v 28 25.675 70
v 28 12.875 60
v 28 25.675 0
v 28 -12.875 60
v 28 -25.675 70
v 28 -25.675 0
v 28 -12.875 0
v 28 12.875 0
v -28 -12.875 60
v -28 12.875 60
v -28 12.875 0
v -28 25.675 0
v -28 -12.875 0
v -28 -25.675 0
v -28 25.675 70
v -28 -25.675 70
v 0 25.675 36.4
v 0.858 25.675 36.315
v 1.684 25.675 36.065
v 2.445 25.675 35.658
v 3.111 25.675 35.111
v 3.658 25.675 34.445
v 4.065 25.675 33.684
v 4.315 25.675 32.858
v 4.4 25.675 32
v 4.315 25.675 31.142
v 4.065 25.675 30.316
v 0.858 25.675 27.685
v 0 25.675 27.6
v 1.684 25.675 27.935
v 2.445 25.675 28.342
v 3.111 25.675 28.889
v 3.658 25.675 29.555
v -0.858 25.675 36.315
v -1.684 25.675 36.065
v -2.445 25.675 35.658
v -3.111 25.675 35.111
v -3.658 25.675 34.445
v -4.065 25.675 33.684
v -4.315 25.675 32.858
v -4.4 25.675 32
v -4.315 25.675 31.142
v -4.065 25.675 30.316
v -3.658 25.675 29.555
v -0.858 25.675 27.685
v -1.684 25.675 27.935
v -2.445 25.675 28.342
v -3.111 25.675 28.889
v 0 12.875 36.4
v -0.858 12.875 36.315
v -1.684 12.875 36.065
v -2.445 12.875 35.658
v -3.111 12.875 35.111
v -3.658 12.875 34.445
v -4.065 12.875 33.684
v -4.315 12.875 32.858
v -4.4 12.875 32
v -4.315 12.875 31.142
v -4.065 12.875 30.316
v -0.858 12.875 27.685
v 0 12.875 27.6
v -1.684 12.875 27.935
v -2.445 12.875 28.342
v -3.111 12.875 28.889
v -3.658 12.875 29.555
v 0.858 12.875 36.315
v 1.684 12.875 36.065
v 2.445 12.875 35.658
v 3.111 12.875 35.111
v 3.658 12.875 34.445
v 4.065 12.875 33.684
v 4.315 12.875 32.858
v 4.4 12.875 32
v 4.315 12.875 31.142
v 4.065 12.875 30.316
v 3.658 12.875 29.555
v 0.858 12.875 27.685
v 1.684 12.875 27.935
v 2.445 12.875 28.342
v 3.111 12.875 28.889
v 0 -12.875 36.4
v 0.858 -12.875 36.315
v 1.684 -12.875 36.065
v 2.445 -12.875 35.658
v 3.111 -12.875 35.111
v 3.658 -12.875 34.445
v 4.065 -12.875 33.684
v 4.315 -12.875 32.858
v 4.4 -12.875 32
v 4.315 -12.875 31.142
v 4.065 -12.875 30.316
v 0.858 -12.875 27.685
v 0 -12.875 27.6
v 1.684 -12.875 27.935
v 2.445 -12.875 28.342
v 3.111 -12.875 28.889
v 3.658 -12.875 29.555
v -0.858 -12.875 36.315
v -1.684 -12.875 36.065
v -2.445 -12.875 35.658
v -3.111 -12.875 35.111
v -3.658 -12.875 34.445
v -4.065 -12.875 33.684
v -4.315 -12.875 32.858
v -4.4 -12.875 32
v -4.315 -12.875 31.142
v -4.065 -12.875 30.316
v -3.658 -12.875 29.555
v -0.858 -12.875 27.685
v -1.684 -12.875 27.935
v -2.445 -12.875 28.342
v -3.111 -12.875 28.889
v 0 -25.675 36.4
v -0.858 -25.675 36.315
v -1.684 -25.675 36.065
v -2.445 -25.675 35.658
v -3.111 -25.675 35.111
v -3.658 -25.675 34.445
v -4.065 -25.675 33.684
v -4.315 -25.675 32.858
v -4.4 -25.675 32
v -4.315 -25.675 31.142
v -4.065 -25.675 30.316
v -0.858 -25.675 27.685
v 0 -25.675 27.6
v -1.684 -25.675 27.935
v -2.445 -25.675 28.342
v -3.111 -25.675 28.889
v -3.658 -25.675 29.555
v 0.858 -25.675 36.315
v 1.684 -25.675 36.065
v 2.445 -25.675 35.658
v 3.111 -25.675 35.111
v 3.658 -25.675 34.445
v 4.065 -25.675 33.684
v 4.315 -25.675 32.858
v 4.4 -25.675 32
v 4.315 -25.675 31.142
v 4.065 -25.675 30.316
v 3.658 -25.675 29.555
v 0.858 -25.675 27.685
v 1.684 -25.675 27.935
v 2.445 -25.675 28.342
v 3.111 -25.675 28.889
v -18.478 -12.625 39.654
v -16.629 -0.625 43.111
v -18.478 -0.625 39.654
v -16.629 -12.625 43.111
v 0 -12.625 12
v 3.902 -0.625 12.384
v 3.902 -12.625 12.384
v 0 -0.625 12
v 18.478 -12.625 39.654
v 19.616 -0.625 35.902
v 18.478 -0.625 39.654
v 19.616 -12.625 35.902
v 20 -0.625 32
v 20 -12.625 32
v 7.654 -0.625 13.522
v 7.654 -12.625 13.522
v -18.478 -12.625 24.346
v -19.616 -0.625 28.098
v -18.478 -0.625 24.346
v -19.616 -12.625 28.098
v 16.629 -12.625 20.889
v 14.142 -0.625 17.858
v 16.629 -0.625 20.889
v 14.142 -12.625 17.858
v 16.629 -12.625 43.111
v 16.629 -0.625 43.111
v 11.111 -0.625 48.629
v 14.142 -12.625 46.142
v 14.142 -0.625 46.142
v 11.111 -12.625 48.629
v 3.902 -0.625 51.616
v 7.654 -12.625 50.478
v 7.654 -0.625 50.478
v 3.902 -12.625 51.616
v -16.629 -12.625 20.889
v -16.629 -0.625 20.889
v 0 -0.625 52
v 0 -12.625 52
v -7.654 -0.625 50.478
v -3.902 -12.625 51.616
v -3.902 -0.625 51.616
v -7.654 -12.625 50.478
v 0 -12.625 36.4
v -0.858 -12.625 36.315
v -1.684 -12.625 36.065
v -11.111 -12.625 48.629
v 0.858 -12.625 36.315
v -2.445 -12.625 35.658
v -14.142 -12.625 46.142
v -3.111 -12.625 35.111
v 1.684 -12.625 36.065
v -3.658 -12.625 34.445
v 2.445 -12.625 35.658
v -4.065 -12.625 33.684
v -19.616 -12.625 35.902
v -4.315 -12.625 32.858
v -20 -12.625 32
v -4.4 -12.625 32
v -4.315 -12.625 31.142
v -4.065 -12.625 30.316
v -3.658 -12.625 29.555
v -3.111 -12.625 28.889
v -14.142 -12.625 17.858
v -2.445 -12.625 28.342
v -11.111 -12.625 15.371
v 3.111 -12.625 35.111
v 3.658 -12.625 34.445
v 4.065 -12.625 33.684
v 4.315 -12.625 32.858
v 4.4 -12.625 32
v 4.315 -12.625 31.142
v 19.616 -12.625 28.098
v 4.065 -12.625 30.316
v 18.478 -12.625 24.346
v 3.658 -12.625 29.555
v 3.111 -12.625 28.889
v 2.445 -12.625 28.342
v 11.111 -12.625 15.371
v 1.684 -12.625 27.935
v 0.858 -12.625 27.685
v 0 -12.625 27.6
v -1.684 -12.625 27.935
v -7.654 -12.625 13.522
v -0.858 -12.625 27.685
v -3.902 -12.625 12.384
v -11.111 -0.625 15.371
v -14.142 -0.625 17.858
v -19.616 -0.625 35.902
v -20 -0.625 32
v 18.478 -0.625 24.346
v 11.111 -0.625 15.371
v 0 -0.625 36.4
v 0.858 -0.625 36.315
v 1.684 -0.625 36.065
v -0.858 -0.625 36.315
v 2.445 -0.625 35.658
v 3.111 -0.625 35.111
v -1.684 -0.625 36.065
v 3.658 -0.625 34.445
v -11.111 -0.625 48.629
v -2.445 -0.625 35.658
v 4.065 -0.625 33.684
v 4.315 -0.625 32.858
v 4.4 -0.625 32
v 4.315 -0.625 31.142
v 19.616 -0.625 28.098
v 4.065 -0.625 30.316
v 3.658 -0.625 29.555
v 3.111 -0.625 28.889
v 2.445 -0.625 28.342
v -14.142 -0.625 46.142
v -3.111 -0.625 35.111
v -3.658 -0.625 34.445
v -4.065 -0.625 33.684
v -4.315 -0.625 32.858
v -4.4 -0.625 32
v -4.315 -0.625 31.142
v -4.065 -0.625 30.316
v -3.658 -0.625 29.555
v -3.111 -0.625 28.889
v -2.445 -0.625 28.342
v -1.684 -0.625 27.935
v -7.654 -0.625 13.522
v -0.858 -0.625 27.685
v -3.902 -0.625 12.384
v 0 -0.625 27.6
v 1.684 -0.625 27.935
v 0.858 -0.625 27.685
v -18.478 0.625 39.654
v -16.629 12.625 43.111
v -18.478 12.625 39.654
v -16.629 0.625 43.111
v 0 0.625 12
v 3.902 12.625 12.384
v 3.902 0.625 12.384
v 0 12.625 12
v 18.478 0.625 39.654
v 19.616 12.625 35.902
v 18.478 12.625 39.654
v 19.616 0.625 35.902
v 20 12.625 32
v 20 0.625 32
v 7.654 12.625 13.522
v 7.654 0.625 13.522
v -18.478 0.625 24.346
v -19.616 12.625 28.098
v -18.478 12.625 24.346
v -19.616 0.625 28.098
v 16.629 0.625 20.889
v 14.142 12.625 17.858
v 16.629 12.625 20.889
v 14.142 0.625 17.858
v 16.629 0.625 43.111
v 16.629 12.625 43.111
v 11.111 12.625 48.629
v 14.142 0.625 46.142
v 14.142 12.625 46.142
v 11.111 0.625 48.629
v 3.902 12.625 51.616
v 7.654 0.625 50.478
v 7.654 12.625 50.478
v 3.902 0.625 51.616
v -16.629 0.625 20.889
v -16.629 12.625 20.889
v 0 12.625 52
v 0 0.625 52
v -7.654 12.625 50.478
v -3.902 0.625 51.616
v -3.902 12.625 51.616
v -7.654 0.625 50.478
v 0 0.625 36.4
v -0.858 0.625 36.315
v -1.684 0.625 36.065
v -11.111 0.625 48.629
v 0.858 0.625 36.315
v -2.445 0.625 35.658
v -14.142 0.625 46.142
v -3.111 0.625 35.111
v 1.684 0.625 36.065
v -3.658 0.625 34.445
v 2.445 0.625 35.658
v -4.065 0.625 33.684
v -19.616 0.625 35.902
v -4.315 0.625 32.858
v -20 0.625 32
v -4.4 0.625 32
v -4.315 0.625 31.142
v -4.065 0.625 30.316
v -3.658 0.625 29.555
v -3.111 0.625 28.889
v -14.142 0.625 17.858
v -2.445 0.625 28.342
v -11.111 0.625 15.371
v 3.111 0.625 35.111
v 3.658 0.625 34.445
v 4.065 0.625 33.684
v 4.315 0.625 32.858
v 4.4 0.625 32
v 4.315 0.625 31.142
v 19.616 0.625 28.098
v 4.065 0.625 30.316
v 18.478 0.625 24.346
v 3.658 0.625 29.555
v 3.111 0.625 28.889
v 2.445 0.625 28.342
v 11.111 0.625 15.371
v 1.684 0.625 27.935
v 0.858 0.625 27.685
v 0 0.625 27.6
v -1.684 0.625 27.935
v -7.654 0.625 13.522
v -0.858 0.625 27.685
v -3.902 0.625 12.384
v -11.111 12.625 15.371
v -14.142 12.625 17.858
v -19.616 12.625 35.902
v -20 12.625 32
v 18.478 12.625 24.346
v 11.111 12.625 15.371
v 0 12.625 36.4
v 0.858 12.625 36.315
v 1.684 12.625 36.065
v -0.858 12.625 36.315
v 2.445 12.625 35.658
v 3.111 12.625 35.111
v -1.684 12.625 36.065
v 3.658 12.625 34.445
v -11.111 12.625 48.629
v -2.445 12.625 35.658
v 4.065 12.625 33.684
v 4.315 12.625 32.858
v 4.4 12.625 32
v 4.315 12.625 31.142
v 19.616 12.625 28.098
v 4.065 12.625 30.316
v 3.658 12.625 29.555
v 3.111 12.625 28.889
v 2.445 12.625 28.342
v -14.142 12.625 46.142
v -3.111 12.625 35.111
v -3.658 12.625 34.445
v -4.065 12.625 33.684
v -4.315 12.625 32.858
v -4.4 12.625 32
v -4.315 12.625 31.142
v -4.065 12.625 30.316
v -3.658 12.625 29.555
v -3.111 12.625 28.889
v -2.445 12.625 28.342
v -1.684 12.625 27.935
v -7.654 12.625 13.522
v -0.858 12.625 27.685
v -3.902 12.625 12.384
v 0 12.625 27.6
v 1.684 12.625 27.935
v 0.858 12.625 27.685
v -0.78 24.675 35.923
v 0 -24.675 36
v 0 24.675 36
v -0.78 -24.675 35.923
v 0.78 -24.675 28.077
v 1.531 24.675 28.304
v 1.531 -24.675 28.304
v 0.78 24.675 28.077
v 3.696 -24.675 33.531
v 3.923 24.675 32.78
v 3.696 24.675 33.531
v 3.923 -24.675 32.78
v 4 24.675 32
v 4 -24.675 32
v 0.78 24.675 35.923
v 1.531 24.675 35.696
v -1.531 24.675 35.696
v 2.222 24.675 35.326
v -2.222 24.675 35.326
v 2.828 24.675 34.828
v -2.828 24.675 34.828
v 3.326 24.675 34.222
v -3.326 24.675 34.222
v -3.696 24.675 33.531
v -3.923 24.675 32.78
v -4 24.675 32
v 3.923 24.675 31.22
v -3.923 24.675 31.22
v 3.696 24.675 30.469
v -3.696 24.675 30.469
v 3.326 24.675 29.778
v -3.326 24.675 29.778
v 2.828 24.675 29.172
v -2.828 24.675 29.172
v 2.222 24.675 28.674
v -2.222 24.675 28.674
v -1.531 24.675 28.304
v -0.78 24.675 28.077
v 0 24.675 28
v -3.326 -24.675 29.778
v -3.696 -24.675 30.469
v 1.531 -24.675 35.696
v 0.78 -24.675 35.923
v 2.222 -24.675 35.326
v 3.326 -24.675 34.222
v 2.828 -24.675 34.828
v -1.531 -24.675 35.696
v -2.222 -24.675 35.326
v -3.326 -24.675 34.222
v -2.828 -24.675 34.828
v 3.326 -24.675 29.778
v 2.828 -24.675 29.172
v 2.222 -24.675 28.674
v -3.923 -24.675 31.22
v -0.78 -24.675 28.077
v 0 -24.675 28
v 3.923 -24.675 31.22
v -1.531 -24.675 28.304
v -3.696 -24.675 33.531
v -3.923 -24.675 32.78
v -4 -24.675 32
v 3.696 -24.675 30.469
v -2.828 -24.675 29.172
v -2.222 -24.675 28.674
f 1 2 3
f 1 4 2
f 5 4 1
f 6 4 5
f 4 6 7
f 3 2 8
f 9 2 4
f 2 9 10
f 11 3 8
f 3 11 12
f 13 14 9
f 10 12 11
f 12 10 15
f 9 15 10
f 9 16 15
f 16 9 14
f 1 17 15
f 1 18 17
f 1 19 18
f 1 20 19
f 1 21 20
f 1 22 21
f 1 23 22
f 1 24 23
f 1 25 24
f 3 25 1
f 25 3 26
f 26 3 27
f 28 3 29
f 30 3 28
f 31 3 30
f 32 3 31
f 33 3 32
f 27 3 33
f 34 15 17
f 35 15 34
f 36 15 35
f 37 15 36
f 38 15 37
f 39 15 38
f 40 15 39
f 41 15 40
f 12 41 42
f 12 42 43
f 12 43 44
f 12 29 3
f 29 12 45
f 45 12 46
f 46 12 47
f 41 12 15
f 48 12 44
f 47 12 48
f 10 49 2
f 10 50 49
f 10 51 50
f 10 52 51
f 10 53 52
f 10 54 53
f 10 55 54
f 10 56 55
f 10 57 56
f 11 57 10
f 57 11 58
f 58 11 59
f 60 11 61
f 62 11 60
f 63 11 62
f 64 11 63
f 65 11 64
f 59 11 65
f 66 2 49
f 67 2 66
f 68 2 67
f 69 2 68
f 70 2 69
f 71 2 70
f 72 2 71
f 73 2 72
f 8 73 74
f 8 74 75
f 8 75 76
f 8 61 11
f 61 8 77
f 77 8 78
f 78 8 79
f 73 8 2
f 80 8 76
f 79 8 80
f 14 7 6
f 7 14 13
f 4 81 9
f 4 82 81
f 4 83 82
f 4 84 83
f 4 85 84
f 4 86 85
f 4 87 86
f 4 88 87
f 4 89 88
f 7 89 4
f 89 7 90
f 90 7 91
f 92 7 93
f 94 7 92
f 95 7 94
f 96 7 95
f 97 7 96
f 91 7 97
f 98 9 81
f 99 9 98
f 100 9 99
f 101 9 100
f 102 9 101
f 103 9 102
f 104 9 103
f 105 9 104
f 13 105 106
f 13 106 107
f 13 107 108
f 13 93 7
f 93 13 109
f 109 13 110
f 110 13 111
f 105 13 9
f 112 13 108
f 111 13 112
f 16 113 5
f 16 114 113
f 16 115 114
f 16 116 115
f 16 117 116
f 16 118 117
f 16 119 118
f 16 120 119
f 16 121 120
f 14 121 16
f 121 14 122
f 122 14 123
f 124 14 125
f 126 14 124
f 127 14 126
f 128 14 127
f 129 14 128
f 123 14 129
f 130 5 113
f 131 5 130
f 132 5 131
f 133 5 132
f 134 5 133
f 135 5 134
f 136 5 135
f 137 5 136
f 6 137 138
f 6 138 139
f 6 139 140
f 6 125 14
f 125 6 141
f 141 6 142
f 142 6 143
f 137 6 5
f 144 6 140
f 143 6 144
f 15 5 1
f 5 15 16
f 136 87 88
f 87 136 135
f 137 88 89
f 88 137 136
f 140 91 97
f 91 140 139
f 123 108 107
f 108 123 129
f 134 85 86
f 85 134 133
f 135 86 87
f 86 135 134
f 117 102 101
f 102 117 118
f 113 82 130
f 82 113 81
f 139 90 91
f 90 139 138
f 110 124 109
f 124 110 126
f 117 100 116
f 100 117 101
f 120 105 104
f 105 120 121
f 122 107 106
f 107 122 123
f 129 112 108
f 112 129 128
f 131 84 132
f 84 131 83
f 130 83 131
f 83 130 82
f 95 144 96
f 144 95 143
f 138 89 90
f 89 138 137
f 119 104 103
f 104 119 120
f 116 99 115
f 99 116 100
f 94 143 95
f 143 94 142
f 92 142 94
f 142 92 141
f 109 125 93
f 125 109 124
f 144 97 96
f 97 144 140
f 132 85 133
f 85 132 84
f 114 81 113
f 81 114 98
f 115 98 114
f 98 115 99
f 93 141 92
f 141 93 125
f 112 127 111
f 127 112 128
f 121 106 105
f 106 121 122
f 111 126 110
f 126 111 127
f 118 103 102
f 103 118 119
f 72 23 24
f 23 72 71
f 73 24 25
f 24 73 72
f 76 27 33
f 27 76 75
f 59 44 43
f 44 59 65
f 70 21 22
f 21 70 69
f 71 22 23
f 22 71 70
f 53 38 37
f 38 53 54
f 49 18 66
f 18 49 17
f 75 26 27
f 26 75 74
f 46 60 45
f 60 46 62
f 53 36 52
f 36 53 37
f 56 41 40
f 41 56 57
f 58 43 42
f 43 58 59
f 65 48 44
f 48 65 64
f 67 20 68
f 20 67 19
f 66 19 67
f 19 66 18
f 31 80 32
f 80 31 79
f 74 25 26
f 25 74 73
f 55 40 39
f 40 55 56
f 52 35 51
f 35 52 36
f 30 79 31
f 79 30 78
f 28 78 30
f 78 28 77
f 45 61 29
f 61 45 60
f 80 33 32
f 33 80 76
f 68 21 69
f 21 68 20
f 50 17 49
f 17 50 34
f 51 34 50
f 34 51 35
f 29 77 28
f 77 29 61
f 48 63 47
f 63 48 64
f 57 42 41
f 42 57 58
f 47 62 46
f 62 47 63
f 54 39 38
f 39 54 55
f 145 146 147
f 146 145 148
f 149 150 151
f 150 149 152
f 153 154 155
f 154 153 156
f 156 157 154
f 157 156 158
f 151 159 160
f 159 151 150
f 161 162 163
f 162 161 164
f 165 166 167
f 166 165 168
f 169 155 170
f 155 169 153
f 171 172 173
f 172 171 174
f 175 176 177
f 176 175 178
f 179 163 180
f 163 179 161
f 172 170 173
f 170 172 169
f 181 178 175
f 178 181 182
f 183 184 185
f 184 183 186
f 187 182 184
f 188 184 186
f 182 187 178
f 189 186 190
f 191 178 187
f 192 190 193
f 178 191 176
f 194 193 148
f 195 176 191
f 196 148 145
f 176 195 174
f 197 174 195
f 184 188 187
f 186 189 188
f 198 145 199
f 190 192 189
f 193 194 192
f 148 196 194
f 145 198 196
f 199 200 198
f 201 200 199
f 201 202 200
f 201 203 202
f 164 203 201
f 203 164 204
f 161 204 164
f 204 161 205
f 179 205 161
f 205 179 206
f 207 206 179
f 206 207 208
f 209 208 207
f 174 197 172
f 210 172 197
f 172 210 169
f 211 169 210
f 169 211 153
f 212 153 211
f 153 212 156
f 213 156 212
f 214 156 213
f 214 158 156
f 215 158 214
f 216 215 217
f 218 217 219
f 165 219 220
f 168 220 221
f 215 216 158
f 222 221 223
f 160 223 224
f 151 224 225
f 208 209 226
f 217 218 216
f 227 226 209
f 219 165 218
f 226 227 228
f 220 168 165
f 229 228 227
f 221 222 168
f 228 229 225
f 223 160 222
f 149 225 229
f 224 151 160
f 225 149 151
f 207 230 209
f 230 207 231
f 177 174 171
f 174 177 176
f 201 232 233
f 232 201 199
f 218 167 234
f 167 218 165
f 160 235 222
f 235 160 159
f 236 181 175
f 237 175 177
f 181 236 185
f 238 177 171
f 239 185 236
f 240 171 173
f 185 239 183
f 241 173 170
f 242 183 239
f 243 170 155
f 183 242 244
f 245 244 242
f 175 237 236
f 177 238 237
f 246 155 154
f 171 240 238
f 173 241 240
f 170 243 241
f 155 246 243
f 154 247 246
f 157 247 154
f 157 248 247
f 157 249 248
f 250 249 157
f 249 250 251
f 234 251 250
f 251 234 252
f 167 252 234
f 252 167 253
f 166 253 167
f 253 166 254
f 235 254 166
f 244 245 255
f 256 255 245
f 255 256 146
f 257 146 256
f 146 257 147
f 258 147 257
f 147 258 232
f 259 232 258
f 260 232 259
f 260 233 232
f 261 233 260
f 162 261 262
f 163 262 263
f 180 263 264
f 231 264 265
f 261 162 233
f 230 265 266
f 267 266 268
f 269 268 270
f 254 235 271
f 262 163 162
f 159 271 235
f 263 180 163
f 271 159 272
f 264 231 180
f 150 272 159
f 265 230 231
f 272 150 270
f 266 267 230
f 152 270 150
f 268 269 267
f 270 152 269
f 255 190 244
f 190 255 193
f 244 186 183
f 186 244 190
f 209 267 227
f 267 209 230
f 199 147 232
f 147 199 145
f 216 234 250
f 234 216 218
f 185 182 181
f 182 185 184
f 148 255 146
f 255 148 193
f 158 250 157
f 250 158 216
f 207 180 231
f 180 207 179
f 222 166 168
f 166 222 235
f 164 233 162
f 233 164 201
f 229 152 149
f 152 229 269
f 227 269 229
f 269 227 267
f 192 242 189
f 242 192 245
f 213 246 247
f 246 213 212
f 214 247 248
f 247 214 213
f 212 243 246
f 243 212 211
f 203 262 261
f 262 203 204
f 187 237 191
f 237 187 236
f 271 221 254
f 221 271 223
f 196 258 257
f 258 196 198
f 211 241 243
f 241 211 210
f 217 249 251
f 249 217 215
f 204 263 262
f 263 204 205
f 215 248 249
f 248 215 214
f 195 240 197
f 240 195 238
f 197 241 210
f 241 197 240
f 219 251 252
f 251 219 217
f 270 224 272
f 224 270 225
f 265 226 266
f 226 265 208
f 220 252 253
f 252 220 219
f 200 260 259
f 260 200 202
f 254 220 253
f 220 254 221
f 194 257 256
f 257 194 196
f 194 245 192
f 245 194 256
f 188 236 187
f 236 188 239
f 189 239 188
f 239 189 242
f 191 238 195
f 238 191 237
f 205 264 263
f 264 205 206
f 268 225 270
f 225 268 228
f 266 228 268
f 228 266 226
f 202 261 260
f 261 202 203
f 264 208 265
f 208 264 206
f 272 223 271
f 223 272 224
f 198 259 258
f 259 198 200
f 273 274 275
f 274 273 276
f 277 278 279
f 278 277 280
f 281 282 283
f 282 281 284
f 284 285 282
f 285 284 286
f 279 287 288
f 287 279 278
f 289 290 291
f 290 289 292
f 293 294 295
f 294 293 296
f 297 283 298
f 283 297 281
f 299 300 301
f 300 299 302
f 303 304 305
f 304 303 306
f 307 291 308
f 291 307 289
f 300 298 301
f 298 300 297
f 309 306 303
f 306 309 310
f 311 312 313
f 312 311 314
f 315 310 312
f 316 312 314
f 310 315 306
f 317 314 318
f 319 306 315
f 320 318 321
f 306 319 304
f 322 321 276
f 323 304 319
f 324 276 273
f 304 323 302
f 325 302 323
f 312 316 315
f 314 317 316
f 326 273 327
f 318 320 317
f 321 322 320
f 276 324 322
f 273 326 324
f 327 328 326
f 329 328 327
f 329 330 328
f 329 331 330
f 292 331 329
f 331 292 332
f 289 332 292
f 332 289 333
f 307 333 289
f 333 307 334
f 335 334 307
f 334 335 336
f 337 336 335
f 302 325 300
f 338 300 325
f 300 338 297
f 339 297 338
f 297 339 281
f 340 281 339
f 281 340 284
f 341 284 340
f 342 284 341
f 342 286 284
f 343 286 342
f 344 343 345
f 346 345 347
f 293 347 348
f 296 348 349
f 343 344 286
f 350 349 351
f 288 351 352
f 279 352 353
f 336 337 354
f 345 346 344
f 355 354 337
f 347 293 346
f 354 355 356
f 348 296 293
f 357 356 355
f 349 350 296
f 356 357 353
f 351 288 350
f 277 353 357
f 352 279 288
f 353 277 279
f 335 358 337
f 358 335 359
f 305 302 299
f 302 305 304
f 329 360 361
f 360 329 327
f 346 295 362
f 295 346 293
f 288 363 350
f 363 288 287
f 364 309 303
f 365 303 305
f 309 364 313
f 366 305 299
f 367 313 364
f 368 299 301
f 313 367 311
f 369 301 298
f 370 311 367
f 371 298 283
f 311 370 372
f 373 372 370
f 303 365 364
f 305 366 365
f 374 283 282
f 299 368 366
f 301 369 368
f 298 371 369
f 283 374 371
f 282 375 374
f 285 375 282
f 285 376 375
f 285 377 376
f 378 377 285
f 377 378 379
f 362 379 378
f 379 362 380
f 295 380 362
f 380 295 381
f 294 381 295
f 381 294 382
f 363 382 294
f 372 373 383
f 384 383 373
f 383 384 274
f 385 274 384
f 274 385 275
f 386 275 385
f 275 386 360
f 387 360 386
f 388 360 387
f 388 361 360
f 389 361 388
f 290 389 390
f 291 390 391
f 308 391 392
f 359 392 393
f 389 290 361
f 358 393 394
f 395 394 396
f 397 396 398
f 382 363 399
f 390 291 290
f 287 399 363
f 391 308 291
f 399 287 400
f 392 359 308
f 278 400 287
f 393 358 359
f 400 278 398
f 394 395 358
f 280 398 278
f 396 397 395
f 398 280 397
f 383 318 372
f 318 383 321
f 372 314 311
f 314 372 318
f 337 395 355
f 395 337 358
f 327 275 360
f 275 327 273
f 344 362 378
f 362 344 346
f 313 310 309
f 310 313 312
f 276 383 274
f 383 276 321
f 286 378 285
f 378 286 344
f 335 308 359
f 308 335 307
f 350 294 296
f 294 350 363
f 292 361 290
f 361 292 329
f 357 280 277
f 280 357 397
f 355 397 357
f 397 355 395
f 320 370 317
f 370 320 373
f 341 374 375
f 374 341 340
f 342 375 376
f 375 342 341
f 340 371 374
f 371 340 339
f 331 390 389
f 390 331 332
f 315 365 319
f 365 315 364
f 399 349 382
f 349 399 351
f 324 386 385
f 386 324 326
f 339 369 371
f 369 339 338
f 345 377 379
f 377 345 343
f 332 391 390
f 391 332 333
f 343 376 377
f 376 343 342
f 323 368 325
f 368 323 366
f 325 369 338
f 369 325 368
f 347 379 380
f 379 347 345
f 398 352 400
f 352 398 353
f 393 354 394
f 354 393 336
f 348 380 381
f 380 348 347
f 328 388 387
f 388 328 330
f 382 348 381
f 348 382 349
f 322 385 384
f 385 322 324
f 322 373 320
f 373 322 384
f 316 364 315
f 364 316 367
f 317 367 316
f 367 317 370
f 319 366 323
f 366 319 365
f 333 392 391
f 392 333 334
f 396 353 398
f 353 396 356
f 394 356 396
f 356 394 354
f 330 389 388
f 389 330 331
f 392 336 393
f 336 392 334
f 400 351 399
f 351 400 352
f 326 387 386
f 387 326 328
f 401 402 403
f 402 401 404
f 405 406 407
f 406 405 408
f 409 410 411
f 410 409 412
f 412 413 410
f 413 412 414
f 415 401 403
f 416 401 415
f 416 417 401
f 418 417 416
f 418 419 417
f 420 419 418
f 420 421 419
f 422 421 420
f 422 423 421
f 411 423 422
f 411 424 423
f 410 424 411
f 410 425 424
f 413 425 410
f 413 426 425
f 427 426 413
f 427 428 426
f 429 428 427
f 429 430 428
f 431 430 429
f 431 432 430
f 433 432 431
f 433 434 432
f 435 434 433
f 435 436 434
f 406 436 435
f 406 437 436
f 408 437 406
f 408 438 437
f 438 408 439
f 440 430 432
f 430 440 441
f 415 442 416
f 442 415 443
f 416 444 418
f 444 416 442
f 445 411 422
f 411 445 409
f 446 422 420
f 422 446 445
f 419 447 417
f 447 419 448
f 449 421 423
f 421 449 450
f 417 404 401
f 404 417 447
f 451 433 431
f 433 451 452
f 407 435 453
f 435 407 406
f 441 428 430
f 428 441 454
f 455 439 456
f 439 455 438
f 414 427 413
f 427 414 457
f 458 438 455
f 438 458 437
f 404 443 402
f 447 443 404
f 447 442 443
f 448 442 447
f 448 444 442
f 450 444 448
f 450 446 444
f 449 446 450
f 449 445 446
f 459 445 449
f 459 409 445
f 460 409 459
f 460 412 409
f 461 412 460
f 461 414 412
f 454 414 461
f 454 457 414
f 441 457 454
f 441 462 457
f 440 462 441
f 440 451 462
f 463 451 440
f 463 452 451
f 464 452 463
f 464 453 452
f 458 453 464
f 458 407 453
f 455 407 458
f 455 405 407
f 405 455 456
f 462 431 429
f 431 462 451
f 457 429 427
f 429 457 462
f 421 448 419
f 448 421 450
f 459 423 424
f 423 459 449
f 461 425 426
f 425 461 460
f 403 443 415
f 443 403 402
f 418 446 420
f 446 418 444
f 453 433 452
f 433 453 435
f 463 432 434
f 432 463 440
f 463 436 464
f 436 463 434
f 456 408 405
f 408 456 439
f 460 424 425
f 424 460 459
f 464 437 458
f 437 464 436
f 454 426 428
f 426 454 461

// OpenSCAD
$fn = 32;

// ------------------------------------------------------------------------
// Trolley wheel set: wheels d40, fork 60 mm tall
// Every part is its own module, assembly() places every instance.
// ------------------------------------------------------------------------

// --- part 1 ---
module trolley_fork() {
  difference() {
    union() {
      translate([-28, 12.875, 0]) cube([56, 12.8, 60]);
      translate([-28, -25.675, 0]) cube([56, 12.8, 60]);
      translate([-28, -25.675, 60]) cube([56, 51.35, 10]);
    }
    translate([0, -19.275, 32]) rotate([90, 0, 0]) cylinder(h = 14.8, d = 8.8, center = true);
    translate([0, 19.275, 32]) rotate([90, 0, 0]) cylinder(h = 14.8, d = 8.8, center = true);
  }
}

// --- part 2 ---
module trolley_wheel() {
  difference() {
      translate([0, 0, 0]) cylinder(h = 12, d = 40);
      translate([0, 0, -1]) cylinder(h = 14, d = 8.8);
    }
}

// --- part 3 ---
module trolley_axle() {
  translate([0, 0, -24.675]) cylinder(h = 49.35, d = 8);
}

// --- assembly ---
module assembly() {
  color([0.80, 0.24, 0.20]) translate([0, 0, 0]) rotate([0, 0, 0]) trolley_fork();
  color([0.20, 0.45, 0.75]) translate([0, -0.625, 32]) rotate([90, 0, 0]) trolley_wheel();
  color([0.25, 0.62, 0.32]) translate([0, 12.625, 32]) rotate([90, 0, 0]) trolley_wheel();
  color([0.92, 0.70, 0.18]) translate([0, 0, 32]) rotate([90, 0, 0]) trolley_axle();
}

assembly();
